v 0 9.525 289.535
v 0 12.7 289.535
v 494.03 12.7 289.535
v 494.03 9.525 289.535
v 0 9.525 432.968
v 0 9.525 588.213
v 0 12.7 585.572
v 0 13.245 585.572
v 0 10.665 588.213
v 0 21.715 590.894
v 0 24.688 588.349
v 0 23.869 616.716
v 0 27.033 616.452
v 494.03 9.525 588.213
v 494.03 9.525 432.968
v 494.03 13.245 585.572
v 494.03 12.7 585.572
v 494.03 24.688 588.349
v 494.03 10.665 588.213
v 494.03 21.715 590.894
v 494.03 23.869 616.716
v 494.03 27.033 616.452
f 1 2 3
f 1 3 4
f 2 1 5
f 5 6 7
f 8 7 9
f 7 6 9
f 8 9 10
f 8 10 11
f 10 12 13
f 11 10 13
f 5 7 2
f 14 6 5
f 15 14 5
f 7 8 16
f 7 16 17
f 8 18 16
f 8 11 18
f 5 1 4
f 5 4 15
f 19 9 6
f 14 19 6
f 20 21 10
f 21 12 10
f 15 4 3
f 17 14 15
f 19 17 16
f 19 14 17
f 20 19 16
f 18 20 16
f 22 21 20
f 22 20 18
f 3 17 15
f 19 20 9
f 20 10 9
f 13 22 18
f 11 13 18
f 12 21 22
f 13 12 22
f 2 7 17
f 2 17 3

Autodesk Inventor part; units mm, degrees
ref_plane "YZ Plane" through (0, 0, 0) normal (1, 0, 0) x (0, 1, 0)
ref_plane "XZ Plane" through (0, 0, 0) normal (0, 1, 0) x (-1, 0, 0)
ref_plane "XY Plane" through (0, 0, 0) normal (0, 0, 1) x (1, 0, 0)
sketch "Sketch1" plane through (0, 0, 0) normal (1, 0, 0) x (0, 1, 0)
  line L0 (0, 0) -> (0, 597.7382)
  line L1 (0, 0) -> (3.175, 0)
  line L2 (3.175, 0) -> (3.175, 594.5632)
  line L3 (3.175, 594.5632) -> (9.906, 594.5632)
  line L4 (9.906, 594.5632) -> (15.756, 595.9828)
  line L5 (0, 597.7382) -> (9.5263, 597.7382)
  line L6 (9.5263, 597.7382) -> (12.7824, 598.5283)
  line L7 (41.2921, 902.0052) -> (15.756, 595.9828)
  line L8 (12.7824, 598.5283) -> (38.1281, 902.2692)
  line L9 (38.1281, 902.2692) -> (41.2921, 902.0052)
  line L10 (41.2921, 902.0052) -> (44.4671, 901.7403)
  line L11 (44.4671, 901.7403) -> (18.7409, 593.44)
  line L12 (18.7409, 593.44) -> (10.2857, 591.3882)
  line L13 (10.2857, 591.3882) -> (6.35, 591.3882)
  line L14 (6.35, 591.3882) -> (6.35, 574.5988)
  line L15 (6.35, 574.5988) -> (3.175, 574.5988)
  line L16 (44.4671, 901.7403) -> (47.6311, 901.4763)
  line L17 (47.6311, 901.4763) -> (21.7146, 590.8944)
  line L18 (21.7146, 590.8944) -> (10.6654, 588.2132)
  line L19 (10.6654, 588.2132) -> (9.525, 588.2132)
  line L20 (9.525, 588.2132) -> (9.525, 432.9684)
  line L21 (9.525, 432.9684) -> (6.35, 432.9684)
  line L22 (6.35, 432.9684) -> (6.35, 574.5988)
  line L23 (32.5862, 759.3601) -> (35.7502, 759.0961)
  line L24 (47.6311, 901.4763) -> (50.7951, 901.2122)
  line L25 (50.7951, 901.2122) -> (24.6882, 588.3489)
  line L26 (24.6882, 588.3489) -> (13.2454, 585.5721)
  line L27 (13.2454, 585.5721) -> (12.7, 585.5721)
  line L28 (12.7, 585.5721) -> (12.7, 289.5351)
  line L29 (23.8692, 616.7159) -> (27.0332, 616.4519)
  line L30 (12.7, 289.5351) -> (9.525, 289.5351)
  line L31 (9.525, 289.5351) -> (9.525, 432.9684)
  point P0 (14.5133, 592.4141)
  dimension "d0" = 594.5632
  dimension "d1" = 3.175
  dimension "d2" = 6.731
  dimension "d7" = 3.175
  dimension "d8" = 6.0198
  dimension "d9" = 166.36
  dimension "d10" = 3.175
  dimension "d11" = 108.41
  dimension "d12" = 3.175
  dimension "d13" = 307.086
  dimension "d18" = 3.175
  dimension "d20" = 307.1025
  dimension "d21" = 8.7006
  dimension "d22" = 3.175
  dimension "d23" = 3.175
  dimension "d24" = 3.9357
  dimension "d25" = 16.7894
  dimension "d28" = 3.175
  dimension "d29" = 3.186
  dimension "d30" = 3.175
  dimension "d32" = 3.175
  dimension "d33" = 3.175
  dimension "d34" = 142.875
  dimension "d35" = 168.7862
  dimension "d36" = 11.3698
  dimension "d37" = 1.1404
  dimension "d38" = 155.2448
  dimension "d41" = 3.175
  dimension "d42" = 3.175
  dimension "d43" = 3.175
  dimension "d44" = 142.875
  dimension "d45" = 296.037
  dimension "d46" = 28.2007
  dimension "d47" = 11.7749
  dimension "d48" = 0.5454
extrude "Extrusion4" add sketch "Sketch1" along normal blind 494.03 contours L20 L19 L18 L17 L29 L25 L26 L27 L28 L30 L31
properties part number "Third_Shingle_Over_Intake_Vent_With_Length_19.45_Inches"
